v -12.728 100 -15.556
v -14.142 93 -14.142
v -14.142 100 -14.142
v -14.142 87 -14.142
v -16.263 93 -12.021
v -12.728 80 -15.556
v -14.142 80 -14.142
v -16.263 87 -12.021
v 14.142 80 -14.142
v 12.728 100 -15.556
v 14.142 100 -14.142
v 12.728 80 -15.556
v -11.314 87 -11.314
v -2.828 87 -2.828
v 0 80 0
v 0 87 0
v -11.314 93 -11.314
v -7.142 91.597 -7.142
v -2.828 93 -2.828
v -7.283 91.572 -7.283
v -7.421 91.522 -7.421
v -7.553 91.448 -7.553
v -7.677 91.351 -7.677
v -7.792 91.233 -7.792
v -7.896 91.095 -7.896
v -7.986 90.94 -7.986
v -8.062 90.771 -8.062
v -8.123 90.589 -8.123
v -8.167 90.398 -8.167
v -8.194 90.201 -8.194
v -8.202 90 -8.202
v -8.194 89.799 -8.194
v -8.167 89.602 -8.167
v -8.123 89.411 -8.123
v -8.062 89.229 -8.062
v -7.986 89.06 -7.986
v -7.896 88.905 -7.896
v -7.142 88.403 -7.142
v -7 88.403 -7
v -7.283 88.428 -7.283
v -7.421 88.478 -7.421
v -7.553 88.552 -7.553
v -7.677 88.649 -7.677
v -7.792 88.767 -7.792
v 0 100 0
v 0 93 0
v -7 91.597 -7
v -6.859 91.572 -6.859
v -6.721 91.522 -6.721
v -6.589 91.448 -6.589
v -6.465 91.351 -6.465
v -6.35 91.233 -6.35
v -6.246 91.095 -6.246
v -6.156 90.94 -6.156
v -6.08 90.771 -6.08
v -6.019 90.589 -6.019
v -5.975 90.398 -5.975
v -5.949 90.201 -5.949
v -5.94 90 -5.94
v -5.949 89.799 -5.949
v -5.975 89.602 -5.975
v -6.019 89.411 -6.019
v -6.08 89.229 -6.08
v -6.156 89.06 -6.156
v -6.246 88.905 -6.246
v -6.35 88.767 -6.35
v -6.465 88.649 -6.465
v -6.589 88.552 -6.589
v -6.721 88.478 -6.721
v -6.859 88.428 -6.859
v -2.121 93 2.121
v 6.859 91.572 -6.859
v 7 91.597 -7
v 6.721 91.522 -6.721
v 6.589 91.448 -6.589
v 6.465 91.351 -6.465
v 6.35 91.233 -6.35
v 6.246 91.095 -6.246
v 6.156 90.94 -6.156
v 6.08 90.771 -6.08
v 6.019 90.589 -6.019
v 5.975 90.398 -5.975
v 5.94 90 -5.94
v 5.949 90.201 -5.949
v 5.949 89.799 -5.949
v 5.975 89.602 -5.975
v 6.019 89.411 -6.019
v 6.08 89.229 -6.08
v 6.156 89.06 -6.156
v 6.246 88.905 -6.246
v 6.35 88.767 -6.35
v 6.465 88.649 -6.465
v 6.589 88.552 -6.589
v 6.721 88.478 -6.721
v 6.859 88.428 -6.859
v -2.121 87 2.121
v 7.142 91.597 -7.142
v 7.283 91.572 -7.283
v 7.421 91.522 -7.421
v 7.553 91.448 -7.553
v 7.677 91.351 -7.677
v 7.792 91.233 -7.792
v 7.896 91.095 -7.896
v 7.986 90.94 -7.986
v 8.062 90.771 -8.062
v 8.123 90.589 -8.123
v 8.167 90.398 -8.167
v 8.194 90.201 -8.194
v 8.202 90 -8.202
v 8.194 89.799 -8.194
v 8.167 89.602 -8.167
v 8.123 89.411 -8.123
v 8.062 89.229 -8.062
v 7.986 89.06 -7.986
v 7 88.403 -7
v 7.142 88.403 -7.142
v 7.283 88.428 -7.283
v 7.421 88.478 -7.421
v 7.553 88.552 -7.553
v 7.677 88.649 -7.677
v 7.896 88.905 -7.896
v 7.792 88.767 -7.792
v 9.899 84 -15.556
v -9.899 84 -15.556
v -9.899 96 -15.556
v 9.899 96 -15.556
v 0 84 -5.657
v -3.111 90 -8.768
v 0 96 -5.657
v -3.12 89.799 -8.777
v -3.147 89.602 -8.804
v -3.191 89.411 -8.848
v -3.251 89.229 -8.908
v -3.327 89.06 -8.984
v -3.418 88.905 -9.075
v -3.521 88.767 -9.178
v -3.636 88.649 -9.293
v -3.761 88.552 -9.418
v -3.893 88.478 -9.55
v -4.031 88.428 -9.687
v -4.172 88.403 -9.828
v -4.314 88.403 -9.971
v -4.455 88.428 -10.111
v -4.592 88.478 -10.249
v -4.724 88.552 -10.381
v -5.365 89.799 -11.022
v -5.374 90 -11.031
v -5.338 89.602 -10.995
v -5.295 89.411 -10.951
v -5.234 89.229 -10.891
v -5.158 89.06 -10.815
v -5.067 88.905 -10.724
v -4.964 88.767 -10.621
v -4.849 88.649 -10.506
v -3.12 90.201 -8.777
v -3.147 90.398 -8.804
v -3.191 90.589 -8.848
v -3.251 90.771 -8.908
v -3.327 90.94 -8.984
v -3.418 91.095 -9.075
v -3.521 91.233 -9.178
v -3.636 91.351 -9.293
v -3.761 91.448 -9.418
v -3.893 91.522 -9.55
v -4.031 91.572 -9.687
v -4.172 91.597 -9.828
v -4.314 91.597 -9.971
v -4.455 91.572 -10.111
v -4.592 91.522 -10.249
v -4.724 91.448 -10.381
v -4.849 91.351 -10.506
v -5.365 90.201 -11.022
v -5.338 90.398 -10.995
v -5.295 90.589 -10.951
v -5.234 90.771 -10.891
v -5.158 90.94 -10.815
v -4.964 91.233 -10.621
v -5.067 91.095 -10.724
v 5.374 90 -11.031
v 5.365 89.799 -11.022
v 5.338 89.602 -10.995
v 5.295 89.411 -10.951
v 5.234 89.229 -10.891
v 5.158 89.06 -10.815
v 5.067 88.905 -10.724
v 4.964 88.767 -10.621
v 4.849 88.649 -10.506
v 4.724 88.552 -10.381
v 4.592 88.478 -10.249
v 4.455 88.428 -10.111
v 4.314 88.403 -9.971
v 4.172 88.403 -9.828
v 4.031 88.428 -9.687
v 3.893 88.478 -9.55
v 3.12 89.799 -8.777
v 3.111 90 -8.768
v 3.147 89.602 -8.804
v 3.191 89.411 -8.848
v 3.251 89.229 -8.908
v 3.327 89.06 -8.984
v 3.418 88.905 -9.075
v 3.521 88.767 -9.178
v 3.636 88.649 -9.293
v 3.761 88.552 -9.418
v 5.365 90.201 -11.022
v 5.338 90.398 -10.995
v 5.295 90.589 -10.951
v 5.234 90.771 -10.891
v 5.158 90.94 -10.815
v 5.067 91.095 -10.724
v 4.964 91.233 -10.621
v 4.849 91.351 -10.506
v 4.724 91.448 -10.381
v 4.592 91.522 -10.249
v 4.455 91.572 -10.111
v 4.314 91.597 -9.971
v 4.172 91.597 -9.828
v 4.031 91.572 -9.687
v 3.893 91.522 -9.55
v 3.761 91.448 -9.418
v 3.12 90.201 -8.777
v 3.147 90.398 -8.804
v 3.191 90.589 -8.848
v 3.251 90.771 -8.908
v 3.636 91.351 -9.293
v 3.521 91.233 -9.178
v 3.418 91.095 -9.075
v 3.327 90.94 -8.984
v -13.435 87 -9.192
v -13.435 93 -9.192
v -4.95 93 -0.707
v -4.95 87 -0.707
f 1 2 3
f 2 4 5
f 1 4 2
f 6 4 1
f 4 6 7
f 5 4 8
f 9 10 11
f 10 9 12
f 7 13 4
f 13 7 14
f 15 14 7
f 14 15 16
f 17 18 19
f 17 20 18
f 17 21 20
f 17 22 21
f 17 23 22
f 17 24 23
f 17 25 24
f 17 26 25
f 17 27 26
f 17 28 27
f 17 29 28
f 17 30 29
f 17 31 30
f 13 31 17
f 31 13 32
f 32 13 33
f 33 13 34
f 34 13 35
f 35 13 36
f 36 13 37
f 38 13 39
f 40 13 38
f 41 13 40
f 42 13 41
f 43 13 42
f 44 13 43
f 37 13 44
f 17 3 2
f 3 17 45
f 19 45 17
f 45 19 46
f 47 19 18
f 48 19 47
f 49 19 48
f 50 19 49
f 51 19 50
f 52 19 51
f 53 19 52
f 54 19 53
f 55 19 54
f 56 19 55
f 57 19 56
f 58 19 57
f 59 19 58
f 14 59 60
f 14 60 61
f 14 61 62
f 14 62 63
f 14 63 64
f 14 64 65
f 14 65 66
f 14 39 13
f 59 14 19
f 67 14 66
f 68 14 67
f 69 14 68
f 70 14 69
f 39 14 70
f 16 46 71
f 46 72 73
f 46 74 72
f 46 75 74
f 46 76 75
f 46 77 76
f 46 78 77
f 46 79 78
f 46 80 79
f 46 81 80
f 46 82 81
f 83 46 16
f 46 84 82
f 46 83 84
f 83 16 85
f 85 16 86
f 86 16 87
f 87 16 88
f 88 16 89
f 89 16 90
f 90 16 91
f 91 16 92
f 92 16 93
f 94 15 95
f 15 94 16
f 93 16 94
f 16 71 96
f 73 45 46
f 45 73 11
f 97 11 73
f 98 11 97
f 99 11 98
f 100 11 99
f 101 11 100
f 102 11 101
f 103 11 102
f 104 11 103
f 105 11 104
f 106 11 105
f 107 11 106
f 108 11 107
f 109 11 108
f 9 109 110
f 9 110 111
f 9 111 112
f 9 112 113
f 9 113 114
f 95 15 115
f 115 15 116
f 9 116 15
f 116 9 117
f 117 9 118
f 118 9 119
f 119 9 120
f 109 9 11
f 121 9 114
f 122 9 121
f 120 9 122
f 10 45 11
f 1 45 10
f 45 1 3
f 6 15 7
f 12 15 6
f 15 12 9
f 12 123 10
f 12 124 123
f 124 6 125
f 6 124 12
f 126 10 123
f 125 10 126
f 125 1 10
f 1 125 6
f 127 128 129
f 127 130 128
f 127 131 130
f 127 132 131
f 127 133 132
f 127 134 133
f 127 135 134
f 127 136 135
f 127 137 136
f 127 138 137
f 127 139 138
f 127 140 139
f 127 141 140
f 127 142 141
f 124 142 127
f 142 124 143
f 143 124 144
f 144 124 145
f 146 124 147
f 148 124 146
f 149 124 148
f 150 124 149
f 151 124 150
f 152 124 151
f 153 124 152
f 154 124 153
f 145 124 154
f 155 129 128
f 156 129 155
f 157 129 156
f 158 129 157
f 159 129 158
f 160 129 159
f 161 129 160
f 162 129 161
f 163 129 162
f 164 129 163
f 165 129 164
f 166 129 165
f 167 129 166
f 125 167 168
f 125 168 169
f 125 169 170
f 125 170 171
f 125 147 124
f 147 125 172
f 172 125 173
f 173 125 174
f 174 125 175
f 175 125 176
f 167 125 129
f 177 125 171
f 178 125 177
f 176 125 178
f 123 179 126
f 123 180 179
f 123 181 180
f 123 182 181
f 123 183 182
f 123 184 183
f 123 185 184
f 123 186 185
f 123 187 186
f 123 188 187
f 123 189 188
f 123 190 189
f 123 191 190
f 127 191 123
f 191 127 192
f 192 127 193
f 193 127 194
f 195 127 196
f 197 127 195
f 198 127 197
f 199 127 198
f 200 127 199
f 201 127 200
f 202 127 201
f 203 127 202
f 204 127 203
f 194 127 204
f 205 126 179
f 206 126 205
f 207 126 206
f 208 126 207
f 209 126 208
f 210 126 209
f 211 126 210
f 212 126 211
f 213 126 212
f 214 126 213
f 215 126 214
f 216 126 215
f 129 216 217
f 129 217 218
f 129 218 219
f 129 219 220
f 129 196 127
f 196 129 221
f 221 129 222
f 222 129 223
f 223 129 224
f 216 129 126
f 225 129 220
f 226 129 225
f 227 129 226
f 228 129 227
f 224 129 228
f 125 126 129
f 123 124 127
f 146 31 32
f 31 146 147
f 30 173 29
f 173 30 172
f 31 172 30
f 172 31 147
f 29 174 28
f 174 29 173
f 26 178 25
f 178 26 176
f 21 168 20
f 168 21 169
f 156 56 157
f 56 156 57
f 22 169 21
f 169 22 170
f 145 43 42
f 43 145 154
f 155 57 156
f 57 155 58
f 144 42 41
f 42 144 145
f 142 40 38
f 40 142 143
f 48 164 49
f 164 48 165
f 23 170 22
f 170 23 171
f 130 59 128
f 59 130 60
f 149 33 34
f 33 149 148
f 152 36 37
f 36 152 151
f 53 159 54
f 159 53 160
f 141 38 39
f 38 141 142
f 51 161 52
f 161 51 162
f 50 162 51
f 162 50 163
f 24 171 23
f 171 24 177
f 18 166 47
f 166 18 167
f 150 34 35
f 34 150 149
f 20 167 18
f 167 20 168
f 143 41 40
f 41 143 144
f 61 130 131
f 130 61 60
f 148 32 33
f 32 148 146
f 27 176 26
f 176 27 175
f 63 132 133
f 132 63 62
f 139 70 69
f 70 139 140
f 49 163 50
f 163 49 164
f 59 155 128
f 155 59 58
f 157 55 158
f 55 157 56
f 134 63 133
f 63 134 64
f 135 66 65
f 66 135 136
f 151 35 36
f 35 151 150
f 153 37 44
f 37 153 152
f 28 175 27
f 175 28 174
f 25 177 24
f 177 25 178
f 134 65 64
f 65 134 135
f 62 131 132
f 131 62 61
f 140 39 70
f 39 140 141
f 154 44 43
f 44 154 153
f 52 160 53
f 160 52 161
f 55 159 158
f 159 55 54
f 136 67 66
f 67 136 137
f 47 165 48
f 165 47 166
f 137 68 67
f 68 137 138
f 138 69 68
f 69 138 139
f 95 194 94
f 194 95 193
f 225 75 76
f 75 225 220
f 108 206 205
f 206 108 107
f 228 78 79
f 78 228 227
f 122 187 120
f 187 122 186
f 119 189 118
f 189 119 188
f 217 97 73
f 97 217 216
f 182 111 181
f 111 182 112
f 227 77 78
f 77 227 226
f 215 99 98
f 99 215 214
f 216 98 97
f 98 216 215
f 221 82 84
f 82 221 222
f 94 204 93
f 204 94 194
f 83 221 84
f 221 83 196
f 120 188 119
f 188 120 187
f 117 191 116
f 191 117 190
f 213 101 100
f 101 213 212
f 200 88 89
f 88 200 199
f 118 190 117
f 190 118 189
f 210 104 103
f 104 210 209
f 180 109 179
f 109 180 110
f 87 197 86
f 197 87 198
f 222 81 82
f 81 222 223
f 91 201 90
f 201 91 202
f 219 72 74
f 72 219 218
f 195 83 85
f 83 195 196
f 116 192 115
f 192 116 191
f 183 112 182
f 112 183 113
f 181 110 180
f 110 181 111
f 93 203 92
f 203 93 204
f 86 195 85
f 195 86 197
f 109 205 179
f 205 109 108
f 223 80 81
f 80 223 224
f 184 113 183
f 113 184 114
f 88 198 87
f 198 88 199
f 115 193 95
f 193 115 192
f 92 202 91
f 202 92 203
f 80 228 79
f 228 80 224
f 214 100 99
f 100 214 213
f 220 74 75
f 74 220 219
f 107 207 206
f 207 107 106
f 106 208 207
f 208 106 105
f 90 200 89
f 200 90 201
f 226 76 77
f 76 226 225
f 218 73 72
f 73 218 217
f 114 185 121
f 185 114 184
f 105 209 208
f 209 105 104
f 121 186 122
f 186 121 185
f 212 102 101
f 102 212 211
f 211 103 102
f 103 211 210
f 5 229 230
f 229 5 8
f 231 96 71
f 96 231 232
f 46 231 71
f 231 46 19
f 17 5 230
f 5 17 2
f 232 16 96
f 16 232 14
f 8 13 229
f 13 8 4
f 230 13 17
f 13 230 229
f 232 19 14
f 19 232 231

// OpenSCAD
// rotate([0, 90+atan(0.5), 0]) b4080();
// rotate([0, 90+45, 0]) translate([0, 40, 0]) b8080();
rotate([0, 90+45, 0]) translate([0, 80, 0]) b2020();

module b4080() {
	difference() {
		cube([40, 20, 80]);
		translate([1.25, -0.1, 80]) rotate([0, atan(2), 0]) cube([160, 20.2, 60]);
		translate([4, 4, 4]) cube([40, 12, 80]);
		// Screws
		// horizontal
		translate([10, 10, -0.1]) cylinder(r=1.6, h=10, $fn=50);
		translate([30, 10, -0.1]) cylinder(r=1.6, h=10, $fn=50);
		// vertical
		translate([-0.1, 10, 10]) rotate([0, 90, 0]) cylinder(r=1.6, h=10, $fn=50);
		translate([-0.1, 10, 30]) rotate([0, 90, 0]) cylinder(r=1.6, h=10, $fn=50);
		translate([-0.1, 10, 50]) rotate([0, 90, 0]) cylinder(r=1.6, h=10, $fn=50);
		translate([-0.1, 10, 70]) rotate([0, 90, 0]) cylinder(r=1.6, h=10, $fn=50);
	}
	translate([0, 7, -3]) difference() {
		cube([40, 6, 3]);
		translate([10, 2.5, 0]) cube([12, 10, 10], center=true);
		translate([30, 2.5, 0]) cube([12, 10, 10], center=true);
	}
}

module b2020() {
	difference() {
		cube([20, 20, 20]);
		translate([2, -0.1, 20]) rotate([0, 45, 0]) cube([160, 20.2, 60]);
		translate([4, 4, 4]) cube([80, 12, 80]);
		// Screws
		// horizontal
		translate([10, 10, -0.1]) cylinder(r=1.6, h=10, $fn=50);
		// vertical
		translate([-0.1, 10, 10]) rotate([0, 90, 0]) cylinder(r=1.6, h=10, $fn=50);
	}
	translate([0, 7, -3]) difference() {
		cube([20, 6, 3]);
		translate([10, 2.5, 0]) cube([12, 10, 10], center=true);
	}
}

module b8080() {
	difference() {
		cube([80, 20, 80]);
		translate([2, -0.1, 80]) rotate([0, 45, 0]) cube([160, 20.2, 60]);
		translate([4, 4, 4]) cube([80, 12, 80]);
		// Screws
		// horizontal
		translate([10, 10, -0.1]) cylinder(r=1.6, h=10, $fn=50);
		translate([30, 10, -0.1]) cylinder(r=1.6, h=10, $fn=50);
		translate([50, 10, -0.1]) cylinder(r=1.6, h=10, $fn=50);
		translate([70, 10, -0.1]) cylinder(r=1.6, h=10, $fn=50);
		// vertical
		translate([-0.1, 10, 10]) rotate([0, 90, 0]) cylinder(r=1.6, h=10, $fn=50);
		translate([-0.1, 10, 30]) rotate([0, 90, 0]) cylinder(r=1.6, h=10, $fn=50);
		translate([-0.1, 10, 50]) rotate([0, 90, 0]) cylinder(r=1.6, h=10, $fn=50);
		translate([-0.1, 10, 70]) rotate([0, 90, 0]) cylinder(r=1.6, h=10, $fn=50);
	}
	translate([0, 7, -3]) difference() {
		cube([80, 6, 3]);
		translate([10, 2.5, 0]) cube([12, 10, 10], center=true);
		translate([30, 2.5, 0]) cube([12, 10, 10], center=true);
		translate([50, 2.5, 0]) cube([12, 10, 10], center=true);
		translate([70, 2.5, 0]) cube([12, 10, 10], center=true);
	}
}
